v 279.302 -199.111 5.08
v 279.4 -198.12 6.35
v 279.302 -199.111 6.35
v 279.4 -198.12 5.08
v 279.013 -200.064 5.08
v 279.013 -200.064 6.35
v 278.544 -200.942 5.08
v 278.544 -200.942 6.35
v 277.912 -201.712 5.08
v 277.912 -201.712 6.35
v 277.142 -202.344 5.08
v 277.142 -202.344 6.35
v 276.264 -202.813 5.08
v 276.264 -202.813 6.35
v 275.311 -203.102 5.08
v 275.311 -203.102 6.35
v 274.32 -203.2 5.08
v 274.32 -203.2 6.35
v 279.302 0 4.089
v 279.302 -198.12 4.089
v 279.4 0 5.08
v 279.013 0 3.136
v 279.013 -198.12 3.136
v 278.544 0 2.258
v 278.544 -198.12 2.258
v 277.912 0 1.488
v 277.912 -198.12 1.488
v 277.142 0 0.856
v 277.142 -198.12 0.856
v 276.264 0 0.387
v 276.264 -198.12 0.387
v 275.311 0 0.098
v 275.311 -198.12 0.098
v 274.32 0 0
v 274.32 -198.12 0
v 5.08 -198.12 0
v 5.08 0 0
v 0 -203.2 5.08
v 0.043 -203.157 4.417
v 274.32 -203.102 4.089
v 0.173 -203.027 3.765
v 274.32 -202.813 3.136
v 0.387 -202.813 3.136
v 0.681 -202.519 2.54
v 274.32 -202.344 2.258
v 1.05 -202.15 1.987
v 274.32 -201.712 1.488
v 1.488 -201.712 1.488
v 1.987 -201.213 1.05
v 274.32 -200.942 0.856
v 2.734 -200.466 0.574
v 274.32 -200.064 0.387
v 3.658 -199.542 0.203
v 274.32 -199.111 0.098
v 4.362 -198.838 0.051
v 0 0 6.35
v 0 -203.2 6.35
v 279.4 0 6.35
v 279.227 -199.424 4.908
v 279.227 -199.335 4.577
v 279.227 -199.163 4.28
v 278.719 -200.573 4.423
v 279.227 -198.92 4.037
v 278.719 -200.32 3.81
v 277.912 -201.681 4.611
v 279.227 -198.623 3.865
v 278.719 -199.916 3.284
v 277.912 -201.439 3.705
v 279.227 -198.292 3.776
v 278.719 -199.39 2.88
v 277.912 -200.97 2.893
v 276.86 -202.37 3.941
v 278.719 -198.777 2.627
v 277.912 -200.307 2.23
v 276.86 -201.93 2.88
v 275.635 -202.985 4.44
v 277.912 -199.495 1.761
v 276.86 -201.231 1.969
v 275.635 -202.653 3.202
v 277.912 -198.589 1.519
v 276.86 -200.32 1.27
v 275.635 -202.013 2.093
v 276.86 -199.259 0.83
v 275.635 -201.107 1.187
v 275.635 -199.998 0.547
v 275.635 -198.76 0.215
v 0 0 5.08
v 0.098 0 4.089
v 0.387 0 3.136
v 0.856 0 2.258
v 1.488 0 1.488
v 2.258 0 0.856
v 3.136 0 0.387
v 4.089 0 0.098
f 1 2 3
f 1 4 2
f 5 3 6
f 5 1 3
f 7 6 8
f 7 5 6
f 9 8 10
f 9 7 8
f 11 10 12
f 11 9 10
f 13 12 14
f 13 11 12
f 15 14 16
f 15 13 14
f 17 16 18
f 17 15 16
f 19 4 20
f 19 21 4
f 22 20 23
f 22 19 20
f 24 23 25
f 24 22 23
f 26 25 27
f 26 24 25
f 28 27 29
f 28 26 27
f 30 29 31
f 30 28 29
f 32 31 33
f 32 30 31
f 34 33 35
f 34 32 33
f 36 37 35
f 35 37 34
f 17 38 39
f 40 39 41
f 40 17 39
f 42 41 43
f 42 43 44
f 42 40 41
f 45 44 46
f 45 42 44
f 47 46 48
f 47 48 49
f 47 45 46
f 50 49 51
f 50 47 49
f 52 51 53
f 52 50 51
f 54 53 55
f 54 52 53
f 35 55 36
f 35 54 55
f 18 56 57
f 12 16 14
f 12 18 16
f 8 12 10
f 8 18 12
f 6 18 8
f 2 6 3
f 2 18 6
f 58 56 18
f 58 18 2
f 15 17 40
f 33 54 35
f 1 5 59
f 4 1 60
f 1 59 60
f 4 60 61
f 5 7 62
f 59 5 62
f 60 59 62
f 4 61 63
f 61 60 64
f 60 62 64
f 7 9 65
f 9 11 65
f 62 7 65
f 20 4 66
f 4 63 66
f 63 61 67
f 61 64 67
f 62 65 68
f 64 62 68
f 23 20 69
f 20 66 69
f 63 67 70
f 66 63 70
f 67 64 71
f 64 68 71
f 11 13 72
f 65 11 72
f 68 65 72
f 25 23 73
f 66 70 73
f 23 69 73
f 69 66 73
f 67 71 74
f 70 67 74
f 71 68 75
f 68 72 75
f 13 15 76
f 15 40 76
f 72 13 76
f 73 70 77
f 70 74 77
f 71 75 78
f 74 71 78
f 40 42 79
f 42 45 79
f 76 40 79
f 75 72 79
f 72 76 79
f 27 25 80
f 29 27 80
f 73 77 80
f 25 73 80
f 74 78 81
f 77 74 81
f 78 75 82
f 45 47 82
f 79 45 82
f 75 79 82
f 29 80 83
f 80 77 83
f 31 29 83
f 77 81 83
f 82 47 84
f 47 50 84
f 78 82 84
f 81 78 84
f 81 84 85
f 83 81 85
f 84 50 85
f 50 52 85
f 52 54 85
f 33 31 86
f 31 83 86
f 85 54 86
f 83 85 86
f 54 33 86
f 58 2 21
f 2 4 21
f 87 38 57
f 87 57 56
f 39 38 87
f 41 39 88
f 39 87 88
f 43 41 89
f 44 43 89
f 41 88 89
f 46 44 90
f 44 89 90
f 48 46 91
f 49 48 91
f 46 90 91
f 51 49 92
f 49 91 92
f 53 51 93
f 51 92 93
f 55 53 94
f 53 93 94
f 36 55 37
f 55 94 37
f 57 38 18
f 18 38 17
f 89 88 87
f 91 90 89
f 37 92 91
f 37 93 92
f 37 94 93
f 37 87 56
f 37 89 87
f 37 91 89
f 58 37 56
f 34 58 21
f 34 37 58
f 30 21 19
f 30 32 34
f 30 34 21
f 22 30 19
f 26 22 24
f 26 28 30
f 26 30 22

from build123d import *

# Parameters (mm, degrees)
F0_W     = 279.4
F0_H     = 203.2
F1_DEPTH = 6.35
F2_R     = 5.08
F3_R     = 5.08


with BuildPart() as f1:
    # F0 (on Top) → F1 (new body)
    with BuildSketch(Plane.XY):
        with Locations((139.7, -101.6)):
            Rectangle(F0_W, F0_H)
    extrude(amount=F1_DEPTH)

    # F2
    f2_edges = [f1.edges().sort_by_distance(p)[0] for p in [
        (139.7, -203.2, 0),
        (0, -101.6, 0),
    ]]
    fillet(f2_edges, radius=F2_R)

    # F3
    f3_edges = [f1.edges().sort_by_distance(p)[0] for p in [
        (279.4, -99.06, 0),
    ]]
    fillet(f3_edges, radius=F3_R)


solid = f1.part
